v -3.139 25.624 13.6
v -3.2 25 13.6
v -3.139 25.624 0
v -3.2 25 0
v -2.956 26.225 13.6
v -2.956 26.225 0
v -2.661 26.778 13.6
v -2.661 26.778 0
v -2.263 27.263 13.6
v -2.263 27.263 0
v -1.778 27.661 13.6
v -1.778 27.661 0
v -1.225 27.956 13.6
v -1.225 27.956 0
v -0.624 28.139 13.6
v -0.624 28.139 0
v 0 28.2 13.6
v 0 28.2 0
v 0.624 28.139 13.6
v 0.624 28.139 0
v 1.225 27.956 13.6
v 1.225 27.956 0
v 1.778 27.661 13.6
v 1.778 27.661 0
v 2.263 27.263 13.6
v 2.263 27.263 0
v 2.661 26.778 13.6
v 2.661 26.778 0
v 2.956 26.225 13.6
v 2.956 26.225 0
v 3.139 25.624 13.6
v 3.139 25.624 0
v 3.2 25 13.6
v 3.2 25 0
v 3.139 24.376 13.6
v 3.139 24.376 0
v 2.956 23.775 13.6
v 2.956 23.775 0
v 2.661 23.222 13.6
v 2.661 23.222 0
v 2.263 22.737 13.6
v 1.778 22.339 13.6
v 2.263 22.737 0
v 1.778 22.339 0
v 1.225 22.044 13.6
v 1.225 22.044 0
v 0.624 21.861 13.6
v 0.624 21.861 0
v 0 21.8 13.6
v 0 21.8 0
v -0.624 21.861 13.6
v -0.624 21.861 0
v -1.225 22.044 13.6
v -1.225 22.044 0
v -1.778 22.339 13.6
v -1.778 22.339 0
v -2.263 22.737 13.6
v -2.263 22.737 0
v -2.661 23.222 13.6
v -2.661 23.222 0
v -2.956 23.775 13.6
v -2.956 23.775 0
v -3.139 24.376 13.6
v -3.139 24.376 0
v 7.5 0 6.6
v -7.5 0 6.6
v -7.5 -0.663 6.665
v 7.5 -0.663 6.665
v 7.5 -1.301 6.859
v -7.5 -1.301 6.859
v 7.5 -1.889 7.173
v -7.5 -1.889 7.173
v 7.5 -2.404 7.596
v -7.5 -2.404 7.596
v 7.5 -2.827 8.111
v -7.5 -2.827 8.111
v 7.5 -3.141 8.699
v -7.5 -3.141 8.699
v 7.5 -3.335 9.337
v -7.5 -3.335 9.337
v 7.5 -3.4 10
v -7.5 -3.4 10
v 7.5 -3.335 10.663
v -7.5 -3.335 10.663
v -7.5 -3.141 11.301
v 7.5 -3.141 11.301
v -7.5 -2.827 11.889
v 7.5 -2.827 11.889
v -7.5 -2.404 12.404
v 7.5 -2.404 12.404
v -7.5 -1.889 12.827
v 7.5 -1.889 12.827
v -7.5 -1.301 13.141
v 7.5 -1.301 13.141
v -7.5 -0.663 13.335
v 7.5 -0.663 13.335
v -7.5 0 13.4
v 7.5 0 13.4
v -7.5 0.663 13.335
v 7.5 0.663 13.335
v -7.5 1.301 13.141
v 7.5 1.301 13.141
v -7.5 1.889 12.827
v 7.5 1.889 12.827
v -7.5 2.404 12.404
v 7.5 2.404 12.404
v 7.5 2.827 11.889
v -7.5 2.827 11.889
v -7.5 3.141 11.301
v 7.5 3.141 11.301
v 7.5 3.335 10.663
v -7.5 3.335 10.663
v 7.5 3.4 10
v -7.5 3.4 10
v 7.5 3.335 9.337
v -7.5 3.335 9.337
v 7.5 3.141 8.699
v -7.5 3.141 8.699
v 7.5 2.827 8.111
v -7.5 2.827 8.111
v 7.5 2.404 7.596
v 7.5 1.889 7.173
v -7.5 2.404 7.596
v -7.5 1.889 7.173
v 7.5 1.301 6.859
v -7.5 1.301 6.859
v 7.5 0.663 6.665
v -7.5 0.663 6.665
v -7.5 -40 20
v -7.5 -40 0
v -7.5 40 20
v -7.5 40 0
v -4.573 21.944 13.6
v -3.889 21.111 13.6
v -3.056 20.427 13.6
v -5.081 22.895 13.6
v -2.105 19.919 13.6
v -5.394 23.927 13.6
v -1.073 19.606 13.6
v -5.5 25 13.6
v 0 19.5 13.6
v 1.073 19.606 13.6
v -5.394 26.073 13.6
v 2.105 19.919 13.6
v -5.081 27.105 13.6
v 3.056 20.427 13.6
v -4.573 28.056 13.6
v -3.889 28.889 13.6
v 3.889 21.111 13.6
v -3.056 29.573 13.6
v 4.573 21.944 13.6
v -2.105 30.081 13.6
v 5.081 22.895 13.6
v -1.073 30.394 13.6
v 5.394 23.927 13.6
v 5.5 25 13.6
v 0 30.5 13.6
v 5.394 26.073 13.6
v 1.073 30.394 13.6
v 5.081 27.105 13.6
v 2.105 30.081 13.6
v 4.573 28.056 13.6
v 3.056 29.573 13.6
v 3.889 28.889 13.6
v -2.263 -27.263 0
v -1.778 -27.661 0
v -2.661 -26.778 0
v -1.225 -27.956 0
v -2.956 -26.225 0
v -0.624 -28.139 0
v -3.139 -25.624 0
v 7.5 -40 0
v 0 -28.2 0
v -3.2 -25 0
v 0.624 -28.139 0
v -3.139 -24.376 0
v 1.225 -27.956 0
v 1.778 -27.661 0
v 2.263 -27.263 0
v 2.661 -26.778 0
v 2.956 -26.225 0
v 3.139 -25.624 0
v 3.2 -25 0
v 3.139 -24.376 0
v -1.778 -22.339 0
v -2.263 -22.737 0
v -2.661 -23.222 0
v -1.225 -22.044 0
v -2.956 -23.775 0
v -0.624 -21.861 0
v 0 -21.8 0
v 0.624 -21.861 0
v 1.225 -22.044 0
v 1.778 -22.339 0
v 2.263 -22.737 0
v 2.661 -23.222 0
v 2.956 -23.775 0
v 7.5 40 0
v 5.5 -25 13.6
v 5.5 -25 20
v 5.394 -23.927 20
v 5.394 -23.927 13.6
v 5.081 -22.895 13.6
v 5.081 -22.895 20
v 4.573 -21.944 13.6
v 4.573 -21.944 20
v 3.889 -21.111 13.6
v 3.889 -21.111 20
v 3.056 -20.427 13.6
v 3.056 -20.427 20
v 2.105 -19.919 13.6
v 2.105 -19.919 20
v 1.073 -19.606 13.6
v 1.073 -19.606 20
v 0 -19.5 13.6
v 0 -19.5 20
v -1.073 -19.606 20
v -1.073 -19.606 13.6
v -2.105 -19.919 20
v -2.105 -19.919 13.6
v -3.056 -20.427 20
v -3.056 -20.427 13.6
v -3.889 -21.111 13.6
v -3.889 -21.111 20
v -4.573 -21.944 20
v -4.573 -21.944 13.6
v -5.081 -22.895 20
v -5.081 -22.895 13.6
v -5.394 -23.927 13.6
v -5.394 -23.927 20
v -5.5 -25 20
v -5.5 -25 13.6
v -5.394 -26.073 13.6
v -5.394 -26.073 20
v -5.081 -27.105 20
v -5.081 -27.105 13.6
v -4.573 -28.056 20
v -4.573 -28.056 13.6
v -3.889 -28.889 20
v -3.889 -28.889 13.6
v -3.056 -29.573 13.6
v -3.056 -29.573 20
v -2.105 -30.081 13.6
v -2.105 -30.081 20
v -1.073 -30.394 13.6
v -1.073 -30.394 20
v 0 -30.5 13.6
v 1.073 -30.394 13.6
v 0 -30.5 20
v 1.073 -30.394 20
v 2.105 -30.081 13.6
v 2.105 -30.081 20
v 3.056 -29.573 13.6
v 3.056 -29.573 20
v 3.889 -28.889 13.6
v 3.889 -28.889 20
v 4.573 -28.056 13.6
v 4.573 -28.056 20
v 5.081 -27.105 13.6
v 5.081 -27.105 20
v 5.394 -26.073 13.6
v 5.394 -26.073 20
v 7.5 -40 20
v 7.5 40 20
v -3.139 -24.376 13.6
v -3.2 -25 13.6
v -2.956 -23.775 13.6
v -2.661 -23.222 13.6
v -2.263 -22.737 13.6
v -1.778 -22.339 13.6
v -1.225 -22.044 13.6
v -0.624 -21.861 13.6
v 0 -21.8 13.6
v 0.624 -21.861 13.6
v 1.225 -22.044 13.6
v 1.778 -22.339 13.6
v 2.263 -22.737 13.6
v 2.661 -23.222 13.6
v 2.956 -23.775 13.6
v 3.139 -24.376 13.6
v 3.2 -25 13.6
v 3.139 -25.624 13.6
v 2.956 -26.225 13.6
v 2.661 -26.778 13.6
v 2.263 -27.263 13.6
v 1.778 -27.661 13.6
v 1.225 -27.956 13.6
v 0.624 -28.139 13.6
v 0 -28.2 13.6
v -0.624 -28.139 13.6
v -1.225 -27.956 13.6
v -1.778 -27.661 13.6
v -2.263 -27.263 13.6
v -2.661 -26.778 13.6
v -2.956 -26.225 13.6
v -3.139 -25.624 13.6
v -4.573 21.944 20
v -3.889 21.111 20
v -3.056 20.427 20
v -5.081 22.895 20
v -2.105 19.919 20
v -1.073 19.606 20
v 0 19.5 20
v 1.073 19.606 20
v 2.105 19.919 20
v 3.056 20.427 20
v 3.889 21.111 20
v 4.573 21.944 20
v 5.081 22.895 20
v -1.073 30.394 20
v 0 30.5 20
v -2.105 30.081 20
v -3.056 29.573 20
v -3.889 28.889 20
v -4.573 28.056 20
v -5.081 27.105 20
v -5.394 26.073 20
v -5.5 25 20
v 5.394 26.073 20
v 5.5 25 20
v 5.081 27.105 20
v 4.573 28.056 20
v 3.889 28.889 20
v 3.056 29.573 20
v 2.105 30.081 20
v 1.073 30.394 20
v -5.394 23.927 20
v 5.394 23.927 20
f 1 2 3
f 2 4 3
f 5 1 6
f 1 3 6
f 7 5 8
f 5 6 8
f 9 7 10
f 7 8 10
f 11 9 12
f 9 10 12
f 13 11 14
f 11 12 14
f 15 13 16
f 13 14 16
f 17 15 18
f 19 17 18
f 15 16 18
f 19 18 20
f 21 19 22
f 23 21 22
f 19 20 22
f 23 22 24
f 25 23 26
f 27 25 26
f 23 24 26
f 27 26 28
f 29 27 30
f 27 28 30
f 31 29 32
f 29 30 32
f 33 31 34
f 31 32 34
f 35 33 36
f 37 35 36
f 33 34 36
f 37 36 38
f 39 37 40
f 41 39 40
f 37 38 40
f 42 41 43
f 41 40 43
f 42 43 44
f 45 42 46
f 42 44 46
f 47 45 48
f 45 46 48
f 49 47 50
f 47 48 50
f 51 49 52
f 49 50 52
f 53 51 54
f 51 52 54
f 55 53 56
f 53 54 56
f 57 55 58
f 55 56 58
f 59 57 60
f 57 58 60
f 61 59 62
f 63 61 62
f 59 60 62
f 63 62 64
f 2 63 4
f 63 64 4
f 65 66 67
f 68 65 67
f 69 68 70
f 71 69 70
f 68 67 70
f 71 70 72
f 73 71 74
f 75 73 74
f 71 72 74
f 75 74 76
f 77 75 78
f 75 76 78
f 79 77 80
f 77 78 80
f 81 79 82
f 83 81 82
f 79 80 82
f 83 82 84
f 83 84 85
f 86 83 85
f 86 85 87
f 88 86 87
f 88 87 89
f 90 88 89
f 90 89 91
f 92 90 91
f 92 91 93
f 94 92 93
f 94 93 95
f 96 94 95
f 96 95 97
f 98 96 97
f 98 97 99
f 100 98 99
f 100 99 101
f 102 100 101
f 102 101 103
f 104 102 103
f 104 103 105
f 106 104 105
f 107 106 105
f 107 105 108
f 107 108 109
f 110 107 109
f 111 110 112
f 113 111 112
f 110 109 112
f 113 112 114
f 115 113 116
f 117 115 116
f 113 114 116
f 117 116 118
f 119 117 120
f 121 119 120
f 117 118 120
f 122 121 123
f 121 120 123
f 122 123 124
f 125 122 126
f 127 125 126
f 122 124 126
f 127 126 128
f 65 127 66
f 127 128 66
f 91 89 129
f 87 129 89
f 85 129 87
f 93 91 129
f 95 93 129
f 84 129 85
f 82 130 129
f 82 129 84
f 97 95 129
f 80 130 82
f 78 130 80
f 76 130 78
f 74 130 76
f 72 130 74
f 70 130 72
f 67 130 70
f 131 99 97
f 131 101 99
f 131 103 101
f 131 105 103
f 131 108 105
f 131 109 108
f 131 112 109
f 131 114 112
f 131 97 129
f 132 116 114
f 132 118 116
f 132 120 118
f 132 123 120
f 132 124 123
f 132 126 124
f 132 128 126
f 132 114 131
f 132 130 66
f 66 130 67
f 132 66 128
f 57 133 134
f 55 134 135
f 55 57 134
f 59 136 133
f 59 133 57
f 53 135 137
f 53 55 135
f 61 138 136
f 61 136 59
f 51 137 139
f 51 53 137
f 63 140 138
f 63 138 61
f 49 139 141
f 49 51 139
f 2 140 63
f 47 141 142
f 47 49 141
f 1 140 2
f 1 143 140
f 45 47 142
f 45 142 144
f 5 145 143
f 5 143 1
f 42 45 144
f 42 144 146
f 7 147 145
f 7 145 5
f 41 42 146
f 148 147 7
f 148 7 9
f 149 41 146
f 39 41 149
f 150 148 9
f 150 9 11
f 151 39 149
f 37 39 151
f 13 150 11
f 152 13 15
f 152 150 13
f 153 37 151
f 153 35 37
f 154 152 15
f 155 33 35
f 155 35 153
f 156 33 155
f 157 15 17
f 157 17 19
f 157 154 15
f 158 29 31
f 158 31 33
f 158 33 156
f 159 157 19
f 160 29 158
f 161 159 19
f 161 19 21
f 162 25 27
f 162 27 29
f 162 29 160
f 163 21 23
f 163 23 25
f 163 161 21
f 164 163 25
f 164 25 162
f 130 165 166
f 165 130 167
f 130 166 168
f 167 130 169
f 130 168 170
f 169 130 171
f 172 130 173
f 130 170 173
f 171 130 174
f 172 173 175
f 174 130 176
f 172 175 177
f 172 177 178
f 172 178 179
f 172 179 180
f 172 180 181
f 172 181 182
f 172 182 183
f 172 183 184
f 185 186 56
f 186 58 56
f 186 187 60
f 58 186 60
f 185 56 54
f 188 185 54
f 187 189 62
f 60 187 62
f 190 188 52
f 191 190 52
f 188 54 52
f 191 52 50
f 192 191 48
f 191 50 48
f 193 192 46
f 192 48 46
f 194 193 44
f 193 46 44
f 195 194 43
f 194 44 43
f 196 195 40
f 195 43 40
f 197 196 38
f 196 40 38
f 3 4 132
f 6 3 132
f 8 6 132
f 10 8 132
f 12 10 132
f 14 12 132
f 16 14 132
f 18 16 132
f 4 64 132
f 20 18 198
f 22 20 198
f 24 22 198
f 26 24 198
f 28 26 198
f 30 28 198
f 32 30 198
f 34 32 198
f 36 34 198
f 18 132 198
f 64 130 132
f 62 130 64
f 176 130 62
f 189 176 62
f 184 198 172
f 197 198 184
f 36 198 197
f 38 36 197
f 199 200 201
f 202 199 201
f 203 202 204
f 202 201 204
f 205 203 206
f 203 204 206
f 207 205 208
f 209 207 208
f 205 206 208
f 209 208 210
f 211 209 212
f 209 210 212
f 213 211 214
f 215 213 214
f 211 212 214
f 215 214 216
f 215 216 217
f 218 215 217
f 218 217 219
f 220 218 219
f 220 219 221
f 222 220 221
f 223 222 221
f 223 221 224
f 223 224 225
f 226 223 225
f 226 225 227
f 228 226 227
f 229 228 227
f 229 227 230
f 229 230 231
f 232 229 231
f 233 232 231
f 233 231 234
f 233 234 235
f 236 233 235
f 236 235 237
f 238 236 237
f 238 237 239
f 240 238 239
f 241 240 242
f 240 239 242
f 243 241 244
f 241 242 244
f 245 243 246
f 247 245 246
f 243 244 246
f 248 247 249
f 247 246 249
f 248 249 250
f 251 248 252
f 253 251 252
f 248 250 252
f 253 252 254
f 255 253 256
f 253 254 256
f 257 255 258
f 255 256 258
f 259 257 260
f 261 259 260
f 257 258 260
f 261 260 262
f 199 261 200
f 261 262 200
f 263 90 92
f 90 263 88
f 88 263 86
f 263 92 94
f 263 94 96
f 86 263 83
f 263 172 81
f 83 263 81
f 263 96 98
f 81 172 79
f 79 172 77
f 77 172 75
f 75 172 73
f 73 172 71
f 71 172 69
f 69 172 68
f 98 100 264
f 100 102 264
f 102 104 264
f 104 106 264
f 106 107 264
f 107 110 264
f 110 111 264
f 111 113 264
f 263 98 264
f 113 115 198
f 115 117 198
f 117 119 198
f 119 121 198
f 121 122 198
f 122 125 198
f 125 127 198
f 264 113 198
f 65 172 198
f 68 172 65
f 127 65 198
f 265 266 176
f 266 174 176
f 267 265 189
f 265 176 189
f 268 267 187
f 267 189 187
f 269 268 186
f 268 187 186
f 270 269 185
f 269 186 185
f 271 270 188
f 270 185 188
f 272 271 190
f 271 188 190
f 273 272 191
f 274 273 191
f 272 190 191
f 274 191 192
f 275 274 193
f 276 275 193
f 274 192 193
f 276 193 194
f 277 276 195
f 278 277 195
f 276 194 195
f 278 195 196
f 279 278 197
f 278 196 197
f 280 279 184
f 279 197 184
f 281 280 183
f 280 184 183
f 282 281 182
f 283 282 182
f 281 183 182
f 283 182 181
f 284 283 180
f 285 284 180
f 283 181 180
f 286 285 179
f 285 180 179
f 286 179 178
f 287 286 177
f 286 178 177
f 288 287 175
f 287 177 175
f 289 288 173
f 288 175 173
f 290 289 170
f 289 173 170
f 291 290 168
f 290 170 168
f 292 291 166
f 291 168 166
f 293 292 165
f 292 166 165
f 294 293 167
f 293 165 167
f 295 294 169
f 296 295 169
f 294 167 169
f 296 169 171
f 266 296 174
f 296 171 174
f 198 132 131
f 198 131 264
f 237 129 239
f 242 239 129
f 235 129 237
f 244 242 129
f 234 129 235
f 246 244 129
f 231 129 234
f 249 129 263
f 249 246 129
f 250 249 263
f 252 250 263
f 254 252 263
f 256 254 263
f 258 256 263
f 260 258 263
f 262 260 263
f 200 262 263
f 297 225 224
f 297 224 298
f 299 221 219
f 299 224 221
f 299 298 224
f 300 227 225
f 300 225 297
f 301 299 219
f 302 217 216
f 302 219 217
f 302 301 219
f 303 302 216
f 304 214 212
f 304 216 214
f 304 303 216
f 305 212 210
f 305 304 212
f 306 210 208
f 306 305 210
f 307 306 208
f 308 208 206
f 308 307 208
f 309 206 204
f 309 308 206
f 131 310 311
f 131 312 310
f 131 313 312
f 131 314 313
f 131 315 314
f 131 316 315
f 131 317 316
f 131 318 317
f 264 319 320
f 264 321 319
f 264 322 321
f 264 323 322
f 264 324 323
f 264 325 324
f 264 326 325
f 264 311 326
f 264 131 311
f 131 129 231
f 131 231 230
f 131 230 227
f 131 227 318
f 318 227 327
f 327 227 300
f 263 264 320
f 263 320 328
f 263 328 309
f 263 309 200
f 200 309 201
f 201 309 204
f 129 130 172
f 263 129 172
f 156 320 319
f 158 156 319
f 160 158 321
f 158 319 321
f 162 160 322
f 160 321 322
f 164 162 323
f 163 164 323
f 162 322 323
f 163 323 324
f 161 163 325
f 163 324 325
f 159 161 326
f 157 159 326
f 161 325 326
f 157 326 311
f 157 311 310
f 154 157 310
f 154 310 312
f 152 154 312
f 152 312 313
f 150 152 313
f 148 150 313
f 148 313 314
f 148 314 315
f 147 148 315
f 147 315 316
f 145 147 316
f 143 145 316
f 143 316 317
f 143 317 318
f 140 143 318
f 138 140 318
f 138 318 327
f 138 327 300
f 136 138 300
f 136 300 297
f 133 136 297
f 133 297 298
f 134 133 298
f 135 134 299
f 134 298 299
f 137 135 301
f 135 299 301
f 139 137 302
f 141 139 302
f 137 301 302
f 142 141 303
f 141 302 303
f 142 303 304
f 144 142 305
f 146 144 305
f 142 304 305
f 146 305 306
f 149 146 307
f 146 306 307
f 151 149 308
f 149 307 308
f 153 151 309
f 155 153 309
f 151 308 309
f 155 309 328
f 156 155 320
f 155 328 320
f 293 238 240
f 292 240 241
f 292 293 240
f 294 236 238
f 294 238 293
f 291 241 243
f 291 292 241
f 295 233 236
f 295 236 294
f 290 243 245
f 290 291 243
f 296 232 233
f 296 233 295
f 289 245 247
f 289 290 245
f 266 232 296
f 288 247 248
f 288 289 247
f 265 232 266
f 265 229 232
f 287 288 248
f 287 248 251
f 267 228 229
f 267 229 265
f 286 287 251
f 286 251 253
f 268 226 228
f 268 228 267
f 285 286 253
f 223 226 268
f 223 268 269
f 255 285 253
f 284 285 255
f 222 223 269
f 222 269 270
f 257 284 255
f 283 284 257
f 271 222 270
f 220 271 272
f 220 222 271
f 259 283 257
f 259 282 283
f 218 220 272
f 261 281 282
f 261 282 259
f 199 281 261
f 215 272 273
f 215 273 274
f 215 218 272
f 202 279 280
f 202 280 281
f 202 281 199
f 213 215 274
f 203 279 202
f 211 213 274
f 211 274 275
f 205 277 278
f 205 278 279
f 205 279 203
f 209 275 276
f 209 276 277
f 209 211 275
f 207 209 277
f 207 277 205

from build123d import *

# Parameters (mm, degrees)
SKETCH_1_W                   = 15
SKETCH_1_H                   = 80
EXTRUDE_1_DEPTH              = 20
HOLE_WIZARD_M8_1_D           = 6.8
HOLE_WIZARD_M8_1_DEPTH       = 19.75
HOLE_WIZARD_M8_1_TIP         = 2.042926105
HOLE_WIZARD_M6_1_D           = 6.4
HOLE_WIZARD_M6_1_CBORE_D     = 11
HOLE_WIZARD_M6_1_CBORE_DEPTH = 6.4


with BuildPart() as part:
    # 草图1 → 凸台-拉伸1 (new body)
    with BuildSketch(Plane.XY):
        Rectangle(SKETCH_1_W, SKETCH_1_H)
    extrude(amount=EXTRUDE_1_DEPTH)

    # M8 螺纹孔1
    with Locations(Plane(origin=(7.5, 0, 10), x_dir=(0, 0, 1), z_dir=(1, 0, 0))):
        with Locations((0, 0)):
            Hole(HOLE_WIZARD_M8_1_D / 2, depth=HOLE_WIZARD_M8_1_DEPTH)
            with Locations((0, 0, -(HOLE_WIZARD_M8_1_DEPTH + HOLE_WIZARD_M8_1_TIP / 2))):  # 118° drill point
                Cone(0, HOLE_WIZARD_M8_1_D / 2, HOLE_WIZARD_M8_1_TIP, mode=Mode.SUBTRACT)

    # M6 六角凹头螺钉的柱形沉头孔1 (through all)
    with Locations(Plane(origin=(0, 25, 20), x_dir=(1, 0, 0), z_dir=(0, 0, 1))):
        with Locations((0, 0), (0, -50)):
            CounterBoreHole(HOLE_WIZARD_M6_1_D / 2, HOLE_WIZARD_M6_1_CBORE_D / 2, HOLE_WIZARD_M6_1_CBORE_DEPTH)


solid = part.part
